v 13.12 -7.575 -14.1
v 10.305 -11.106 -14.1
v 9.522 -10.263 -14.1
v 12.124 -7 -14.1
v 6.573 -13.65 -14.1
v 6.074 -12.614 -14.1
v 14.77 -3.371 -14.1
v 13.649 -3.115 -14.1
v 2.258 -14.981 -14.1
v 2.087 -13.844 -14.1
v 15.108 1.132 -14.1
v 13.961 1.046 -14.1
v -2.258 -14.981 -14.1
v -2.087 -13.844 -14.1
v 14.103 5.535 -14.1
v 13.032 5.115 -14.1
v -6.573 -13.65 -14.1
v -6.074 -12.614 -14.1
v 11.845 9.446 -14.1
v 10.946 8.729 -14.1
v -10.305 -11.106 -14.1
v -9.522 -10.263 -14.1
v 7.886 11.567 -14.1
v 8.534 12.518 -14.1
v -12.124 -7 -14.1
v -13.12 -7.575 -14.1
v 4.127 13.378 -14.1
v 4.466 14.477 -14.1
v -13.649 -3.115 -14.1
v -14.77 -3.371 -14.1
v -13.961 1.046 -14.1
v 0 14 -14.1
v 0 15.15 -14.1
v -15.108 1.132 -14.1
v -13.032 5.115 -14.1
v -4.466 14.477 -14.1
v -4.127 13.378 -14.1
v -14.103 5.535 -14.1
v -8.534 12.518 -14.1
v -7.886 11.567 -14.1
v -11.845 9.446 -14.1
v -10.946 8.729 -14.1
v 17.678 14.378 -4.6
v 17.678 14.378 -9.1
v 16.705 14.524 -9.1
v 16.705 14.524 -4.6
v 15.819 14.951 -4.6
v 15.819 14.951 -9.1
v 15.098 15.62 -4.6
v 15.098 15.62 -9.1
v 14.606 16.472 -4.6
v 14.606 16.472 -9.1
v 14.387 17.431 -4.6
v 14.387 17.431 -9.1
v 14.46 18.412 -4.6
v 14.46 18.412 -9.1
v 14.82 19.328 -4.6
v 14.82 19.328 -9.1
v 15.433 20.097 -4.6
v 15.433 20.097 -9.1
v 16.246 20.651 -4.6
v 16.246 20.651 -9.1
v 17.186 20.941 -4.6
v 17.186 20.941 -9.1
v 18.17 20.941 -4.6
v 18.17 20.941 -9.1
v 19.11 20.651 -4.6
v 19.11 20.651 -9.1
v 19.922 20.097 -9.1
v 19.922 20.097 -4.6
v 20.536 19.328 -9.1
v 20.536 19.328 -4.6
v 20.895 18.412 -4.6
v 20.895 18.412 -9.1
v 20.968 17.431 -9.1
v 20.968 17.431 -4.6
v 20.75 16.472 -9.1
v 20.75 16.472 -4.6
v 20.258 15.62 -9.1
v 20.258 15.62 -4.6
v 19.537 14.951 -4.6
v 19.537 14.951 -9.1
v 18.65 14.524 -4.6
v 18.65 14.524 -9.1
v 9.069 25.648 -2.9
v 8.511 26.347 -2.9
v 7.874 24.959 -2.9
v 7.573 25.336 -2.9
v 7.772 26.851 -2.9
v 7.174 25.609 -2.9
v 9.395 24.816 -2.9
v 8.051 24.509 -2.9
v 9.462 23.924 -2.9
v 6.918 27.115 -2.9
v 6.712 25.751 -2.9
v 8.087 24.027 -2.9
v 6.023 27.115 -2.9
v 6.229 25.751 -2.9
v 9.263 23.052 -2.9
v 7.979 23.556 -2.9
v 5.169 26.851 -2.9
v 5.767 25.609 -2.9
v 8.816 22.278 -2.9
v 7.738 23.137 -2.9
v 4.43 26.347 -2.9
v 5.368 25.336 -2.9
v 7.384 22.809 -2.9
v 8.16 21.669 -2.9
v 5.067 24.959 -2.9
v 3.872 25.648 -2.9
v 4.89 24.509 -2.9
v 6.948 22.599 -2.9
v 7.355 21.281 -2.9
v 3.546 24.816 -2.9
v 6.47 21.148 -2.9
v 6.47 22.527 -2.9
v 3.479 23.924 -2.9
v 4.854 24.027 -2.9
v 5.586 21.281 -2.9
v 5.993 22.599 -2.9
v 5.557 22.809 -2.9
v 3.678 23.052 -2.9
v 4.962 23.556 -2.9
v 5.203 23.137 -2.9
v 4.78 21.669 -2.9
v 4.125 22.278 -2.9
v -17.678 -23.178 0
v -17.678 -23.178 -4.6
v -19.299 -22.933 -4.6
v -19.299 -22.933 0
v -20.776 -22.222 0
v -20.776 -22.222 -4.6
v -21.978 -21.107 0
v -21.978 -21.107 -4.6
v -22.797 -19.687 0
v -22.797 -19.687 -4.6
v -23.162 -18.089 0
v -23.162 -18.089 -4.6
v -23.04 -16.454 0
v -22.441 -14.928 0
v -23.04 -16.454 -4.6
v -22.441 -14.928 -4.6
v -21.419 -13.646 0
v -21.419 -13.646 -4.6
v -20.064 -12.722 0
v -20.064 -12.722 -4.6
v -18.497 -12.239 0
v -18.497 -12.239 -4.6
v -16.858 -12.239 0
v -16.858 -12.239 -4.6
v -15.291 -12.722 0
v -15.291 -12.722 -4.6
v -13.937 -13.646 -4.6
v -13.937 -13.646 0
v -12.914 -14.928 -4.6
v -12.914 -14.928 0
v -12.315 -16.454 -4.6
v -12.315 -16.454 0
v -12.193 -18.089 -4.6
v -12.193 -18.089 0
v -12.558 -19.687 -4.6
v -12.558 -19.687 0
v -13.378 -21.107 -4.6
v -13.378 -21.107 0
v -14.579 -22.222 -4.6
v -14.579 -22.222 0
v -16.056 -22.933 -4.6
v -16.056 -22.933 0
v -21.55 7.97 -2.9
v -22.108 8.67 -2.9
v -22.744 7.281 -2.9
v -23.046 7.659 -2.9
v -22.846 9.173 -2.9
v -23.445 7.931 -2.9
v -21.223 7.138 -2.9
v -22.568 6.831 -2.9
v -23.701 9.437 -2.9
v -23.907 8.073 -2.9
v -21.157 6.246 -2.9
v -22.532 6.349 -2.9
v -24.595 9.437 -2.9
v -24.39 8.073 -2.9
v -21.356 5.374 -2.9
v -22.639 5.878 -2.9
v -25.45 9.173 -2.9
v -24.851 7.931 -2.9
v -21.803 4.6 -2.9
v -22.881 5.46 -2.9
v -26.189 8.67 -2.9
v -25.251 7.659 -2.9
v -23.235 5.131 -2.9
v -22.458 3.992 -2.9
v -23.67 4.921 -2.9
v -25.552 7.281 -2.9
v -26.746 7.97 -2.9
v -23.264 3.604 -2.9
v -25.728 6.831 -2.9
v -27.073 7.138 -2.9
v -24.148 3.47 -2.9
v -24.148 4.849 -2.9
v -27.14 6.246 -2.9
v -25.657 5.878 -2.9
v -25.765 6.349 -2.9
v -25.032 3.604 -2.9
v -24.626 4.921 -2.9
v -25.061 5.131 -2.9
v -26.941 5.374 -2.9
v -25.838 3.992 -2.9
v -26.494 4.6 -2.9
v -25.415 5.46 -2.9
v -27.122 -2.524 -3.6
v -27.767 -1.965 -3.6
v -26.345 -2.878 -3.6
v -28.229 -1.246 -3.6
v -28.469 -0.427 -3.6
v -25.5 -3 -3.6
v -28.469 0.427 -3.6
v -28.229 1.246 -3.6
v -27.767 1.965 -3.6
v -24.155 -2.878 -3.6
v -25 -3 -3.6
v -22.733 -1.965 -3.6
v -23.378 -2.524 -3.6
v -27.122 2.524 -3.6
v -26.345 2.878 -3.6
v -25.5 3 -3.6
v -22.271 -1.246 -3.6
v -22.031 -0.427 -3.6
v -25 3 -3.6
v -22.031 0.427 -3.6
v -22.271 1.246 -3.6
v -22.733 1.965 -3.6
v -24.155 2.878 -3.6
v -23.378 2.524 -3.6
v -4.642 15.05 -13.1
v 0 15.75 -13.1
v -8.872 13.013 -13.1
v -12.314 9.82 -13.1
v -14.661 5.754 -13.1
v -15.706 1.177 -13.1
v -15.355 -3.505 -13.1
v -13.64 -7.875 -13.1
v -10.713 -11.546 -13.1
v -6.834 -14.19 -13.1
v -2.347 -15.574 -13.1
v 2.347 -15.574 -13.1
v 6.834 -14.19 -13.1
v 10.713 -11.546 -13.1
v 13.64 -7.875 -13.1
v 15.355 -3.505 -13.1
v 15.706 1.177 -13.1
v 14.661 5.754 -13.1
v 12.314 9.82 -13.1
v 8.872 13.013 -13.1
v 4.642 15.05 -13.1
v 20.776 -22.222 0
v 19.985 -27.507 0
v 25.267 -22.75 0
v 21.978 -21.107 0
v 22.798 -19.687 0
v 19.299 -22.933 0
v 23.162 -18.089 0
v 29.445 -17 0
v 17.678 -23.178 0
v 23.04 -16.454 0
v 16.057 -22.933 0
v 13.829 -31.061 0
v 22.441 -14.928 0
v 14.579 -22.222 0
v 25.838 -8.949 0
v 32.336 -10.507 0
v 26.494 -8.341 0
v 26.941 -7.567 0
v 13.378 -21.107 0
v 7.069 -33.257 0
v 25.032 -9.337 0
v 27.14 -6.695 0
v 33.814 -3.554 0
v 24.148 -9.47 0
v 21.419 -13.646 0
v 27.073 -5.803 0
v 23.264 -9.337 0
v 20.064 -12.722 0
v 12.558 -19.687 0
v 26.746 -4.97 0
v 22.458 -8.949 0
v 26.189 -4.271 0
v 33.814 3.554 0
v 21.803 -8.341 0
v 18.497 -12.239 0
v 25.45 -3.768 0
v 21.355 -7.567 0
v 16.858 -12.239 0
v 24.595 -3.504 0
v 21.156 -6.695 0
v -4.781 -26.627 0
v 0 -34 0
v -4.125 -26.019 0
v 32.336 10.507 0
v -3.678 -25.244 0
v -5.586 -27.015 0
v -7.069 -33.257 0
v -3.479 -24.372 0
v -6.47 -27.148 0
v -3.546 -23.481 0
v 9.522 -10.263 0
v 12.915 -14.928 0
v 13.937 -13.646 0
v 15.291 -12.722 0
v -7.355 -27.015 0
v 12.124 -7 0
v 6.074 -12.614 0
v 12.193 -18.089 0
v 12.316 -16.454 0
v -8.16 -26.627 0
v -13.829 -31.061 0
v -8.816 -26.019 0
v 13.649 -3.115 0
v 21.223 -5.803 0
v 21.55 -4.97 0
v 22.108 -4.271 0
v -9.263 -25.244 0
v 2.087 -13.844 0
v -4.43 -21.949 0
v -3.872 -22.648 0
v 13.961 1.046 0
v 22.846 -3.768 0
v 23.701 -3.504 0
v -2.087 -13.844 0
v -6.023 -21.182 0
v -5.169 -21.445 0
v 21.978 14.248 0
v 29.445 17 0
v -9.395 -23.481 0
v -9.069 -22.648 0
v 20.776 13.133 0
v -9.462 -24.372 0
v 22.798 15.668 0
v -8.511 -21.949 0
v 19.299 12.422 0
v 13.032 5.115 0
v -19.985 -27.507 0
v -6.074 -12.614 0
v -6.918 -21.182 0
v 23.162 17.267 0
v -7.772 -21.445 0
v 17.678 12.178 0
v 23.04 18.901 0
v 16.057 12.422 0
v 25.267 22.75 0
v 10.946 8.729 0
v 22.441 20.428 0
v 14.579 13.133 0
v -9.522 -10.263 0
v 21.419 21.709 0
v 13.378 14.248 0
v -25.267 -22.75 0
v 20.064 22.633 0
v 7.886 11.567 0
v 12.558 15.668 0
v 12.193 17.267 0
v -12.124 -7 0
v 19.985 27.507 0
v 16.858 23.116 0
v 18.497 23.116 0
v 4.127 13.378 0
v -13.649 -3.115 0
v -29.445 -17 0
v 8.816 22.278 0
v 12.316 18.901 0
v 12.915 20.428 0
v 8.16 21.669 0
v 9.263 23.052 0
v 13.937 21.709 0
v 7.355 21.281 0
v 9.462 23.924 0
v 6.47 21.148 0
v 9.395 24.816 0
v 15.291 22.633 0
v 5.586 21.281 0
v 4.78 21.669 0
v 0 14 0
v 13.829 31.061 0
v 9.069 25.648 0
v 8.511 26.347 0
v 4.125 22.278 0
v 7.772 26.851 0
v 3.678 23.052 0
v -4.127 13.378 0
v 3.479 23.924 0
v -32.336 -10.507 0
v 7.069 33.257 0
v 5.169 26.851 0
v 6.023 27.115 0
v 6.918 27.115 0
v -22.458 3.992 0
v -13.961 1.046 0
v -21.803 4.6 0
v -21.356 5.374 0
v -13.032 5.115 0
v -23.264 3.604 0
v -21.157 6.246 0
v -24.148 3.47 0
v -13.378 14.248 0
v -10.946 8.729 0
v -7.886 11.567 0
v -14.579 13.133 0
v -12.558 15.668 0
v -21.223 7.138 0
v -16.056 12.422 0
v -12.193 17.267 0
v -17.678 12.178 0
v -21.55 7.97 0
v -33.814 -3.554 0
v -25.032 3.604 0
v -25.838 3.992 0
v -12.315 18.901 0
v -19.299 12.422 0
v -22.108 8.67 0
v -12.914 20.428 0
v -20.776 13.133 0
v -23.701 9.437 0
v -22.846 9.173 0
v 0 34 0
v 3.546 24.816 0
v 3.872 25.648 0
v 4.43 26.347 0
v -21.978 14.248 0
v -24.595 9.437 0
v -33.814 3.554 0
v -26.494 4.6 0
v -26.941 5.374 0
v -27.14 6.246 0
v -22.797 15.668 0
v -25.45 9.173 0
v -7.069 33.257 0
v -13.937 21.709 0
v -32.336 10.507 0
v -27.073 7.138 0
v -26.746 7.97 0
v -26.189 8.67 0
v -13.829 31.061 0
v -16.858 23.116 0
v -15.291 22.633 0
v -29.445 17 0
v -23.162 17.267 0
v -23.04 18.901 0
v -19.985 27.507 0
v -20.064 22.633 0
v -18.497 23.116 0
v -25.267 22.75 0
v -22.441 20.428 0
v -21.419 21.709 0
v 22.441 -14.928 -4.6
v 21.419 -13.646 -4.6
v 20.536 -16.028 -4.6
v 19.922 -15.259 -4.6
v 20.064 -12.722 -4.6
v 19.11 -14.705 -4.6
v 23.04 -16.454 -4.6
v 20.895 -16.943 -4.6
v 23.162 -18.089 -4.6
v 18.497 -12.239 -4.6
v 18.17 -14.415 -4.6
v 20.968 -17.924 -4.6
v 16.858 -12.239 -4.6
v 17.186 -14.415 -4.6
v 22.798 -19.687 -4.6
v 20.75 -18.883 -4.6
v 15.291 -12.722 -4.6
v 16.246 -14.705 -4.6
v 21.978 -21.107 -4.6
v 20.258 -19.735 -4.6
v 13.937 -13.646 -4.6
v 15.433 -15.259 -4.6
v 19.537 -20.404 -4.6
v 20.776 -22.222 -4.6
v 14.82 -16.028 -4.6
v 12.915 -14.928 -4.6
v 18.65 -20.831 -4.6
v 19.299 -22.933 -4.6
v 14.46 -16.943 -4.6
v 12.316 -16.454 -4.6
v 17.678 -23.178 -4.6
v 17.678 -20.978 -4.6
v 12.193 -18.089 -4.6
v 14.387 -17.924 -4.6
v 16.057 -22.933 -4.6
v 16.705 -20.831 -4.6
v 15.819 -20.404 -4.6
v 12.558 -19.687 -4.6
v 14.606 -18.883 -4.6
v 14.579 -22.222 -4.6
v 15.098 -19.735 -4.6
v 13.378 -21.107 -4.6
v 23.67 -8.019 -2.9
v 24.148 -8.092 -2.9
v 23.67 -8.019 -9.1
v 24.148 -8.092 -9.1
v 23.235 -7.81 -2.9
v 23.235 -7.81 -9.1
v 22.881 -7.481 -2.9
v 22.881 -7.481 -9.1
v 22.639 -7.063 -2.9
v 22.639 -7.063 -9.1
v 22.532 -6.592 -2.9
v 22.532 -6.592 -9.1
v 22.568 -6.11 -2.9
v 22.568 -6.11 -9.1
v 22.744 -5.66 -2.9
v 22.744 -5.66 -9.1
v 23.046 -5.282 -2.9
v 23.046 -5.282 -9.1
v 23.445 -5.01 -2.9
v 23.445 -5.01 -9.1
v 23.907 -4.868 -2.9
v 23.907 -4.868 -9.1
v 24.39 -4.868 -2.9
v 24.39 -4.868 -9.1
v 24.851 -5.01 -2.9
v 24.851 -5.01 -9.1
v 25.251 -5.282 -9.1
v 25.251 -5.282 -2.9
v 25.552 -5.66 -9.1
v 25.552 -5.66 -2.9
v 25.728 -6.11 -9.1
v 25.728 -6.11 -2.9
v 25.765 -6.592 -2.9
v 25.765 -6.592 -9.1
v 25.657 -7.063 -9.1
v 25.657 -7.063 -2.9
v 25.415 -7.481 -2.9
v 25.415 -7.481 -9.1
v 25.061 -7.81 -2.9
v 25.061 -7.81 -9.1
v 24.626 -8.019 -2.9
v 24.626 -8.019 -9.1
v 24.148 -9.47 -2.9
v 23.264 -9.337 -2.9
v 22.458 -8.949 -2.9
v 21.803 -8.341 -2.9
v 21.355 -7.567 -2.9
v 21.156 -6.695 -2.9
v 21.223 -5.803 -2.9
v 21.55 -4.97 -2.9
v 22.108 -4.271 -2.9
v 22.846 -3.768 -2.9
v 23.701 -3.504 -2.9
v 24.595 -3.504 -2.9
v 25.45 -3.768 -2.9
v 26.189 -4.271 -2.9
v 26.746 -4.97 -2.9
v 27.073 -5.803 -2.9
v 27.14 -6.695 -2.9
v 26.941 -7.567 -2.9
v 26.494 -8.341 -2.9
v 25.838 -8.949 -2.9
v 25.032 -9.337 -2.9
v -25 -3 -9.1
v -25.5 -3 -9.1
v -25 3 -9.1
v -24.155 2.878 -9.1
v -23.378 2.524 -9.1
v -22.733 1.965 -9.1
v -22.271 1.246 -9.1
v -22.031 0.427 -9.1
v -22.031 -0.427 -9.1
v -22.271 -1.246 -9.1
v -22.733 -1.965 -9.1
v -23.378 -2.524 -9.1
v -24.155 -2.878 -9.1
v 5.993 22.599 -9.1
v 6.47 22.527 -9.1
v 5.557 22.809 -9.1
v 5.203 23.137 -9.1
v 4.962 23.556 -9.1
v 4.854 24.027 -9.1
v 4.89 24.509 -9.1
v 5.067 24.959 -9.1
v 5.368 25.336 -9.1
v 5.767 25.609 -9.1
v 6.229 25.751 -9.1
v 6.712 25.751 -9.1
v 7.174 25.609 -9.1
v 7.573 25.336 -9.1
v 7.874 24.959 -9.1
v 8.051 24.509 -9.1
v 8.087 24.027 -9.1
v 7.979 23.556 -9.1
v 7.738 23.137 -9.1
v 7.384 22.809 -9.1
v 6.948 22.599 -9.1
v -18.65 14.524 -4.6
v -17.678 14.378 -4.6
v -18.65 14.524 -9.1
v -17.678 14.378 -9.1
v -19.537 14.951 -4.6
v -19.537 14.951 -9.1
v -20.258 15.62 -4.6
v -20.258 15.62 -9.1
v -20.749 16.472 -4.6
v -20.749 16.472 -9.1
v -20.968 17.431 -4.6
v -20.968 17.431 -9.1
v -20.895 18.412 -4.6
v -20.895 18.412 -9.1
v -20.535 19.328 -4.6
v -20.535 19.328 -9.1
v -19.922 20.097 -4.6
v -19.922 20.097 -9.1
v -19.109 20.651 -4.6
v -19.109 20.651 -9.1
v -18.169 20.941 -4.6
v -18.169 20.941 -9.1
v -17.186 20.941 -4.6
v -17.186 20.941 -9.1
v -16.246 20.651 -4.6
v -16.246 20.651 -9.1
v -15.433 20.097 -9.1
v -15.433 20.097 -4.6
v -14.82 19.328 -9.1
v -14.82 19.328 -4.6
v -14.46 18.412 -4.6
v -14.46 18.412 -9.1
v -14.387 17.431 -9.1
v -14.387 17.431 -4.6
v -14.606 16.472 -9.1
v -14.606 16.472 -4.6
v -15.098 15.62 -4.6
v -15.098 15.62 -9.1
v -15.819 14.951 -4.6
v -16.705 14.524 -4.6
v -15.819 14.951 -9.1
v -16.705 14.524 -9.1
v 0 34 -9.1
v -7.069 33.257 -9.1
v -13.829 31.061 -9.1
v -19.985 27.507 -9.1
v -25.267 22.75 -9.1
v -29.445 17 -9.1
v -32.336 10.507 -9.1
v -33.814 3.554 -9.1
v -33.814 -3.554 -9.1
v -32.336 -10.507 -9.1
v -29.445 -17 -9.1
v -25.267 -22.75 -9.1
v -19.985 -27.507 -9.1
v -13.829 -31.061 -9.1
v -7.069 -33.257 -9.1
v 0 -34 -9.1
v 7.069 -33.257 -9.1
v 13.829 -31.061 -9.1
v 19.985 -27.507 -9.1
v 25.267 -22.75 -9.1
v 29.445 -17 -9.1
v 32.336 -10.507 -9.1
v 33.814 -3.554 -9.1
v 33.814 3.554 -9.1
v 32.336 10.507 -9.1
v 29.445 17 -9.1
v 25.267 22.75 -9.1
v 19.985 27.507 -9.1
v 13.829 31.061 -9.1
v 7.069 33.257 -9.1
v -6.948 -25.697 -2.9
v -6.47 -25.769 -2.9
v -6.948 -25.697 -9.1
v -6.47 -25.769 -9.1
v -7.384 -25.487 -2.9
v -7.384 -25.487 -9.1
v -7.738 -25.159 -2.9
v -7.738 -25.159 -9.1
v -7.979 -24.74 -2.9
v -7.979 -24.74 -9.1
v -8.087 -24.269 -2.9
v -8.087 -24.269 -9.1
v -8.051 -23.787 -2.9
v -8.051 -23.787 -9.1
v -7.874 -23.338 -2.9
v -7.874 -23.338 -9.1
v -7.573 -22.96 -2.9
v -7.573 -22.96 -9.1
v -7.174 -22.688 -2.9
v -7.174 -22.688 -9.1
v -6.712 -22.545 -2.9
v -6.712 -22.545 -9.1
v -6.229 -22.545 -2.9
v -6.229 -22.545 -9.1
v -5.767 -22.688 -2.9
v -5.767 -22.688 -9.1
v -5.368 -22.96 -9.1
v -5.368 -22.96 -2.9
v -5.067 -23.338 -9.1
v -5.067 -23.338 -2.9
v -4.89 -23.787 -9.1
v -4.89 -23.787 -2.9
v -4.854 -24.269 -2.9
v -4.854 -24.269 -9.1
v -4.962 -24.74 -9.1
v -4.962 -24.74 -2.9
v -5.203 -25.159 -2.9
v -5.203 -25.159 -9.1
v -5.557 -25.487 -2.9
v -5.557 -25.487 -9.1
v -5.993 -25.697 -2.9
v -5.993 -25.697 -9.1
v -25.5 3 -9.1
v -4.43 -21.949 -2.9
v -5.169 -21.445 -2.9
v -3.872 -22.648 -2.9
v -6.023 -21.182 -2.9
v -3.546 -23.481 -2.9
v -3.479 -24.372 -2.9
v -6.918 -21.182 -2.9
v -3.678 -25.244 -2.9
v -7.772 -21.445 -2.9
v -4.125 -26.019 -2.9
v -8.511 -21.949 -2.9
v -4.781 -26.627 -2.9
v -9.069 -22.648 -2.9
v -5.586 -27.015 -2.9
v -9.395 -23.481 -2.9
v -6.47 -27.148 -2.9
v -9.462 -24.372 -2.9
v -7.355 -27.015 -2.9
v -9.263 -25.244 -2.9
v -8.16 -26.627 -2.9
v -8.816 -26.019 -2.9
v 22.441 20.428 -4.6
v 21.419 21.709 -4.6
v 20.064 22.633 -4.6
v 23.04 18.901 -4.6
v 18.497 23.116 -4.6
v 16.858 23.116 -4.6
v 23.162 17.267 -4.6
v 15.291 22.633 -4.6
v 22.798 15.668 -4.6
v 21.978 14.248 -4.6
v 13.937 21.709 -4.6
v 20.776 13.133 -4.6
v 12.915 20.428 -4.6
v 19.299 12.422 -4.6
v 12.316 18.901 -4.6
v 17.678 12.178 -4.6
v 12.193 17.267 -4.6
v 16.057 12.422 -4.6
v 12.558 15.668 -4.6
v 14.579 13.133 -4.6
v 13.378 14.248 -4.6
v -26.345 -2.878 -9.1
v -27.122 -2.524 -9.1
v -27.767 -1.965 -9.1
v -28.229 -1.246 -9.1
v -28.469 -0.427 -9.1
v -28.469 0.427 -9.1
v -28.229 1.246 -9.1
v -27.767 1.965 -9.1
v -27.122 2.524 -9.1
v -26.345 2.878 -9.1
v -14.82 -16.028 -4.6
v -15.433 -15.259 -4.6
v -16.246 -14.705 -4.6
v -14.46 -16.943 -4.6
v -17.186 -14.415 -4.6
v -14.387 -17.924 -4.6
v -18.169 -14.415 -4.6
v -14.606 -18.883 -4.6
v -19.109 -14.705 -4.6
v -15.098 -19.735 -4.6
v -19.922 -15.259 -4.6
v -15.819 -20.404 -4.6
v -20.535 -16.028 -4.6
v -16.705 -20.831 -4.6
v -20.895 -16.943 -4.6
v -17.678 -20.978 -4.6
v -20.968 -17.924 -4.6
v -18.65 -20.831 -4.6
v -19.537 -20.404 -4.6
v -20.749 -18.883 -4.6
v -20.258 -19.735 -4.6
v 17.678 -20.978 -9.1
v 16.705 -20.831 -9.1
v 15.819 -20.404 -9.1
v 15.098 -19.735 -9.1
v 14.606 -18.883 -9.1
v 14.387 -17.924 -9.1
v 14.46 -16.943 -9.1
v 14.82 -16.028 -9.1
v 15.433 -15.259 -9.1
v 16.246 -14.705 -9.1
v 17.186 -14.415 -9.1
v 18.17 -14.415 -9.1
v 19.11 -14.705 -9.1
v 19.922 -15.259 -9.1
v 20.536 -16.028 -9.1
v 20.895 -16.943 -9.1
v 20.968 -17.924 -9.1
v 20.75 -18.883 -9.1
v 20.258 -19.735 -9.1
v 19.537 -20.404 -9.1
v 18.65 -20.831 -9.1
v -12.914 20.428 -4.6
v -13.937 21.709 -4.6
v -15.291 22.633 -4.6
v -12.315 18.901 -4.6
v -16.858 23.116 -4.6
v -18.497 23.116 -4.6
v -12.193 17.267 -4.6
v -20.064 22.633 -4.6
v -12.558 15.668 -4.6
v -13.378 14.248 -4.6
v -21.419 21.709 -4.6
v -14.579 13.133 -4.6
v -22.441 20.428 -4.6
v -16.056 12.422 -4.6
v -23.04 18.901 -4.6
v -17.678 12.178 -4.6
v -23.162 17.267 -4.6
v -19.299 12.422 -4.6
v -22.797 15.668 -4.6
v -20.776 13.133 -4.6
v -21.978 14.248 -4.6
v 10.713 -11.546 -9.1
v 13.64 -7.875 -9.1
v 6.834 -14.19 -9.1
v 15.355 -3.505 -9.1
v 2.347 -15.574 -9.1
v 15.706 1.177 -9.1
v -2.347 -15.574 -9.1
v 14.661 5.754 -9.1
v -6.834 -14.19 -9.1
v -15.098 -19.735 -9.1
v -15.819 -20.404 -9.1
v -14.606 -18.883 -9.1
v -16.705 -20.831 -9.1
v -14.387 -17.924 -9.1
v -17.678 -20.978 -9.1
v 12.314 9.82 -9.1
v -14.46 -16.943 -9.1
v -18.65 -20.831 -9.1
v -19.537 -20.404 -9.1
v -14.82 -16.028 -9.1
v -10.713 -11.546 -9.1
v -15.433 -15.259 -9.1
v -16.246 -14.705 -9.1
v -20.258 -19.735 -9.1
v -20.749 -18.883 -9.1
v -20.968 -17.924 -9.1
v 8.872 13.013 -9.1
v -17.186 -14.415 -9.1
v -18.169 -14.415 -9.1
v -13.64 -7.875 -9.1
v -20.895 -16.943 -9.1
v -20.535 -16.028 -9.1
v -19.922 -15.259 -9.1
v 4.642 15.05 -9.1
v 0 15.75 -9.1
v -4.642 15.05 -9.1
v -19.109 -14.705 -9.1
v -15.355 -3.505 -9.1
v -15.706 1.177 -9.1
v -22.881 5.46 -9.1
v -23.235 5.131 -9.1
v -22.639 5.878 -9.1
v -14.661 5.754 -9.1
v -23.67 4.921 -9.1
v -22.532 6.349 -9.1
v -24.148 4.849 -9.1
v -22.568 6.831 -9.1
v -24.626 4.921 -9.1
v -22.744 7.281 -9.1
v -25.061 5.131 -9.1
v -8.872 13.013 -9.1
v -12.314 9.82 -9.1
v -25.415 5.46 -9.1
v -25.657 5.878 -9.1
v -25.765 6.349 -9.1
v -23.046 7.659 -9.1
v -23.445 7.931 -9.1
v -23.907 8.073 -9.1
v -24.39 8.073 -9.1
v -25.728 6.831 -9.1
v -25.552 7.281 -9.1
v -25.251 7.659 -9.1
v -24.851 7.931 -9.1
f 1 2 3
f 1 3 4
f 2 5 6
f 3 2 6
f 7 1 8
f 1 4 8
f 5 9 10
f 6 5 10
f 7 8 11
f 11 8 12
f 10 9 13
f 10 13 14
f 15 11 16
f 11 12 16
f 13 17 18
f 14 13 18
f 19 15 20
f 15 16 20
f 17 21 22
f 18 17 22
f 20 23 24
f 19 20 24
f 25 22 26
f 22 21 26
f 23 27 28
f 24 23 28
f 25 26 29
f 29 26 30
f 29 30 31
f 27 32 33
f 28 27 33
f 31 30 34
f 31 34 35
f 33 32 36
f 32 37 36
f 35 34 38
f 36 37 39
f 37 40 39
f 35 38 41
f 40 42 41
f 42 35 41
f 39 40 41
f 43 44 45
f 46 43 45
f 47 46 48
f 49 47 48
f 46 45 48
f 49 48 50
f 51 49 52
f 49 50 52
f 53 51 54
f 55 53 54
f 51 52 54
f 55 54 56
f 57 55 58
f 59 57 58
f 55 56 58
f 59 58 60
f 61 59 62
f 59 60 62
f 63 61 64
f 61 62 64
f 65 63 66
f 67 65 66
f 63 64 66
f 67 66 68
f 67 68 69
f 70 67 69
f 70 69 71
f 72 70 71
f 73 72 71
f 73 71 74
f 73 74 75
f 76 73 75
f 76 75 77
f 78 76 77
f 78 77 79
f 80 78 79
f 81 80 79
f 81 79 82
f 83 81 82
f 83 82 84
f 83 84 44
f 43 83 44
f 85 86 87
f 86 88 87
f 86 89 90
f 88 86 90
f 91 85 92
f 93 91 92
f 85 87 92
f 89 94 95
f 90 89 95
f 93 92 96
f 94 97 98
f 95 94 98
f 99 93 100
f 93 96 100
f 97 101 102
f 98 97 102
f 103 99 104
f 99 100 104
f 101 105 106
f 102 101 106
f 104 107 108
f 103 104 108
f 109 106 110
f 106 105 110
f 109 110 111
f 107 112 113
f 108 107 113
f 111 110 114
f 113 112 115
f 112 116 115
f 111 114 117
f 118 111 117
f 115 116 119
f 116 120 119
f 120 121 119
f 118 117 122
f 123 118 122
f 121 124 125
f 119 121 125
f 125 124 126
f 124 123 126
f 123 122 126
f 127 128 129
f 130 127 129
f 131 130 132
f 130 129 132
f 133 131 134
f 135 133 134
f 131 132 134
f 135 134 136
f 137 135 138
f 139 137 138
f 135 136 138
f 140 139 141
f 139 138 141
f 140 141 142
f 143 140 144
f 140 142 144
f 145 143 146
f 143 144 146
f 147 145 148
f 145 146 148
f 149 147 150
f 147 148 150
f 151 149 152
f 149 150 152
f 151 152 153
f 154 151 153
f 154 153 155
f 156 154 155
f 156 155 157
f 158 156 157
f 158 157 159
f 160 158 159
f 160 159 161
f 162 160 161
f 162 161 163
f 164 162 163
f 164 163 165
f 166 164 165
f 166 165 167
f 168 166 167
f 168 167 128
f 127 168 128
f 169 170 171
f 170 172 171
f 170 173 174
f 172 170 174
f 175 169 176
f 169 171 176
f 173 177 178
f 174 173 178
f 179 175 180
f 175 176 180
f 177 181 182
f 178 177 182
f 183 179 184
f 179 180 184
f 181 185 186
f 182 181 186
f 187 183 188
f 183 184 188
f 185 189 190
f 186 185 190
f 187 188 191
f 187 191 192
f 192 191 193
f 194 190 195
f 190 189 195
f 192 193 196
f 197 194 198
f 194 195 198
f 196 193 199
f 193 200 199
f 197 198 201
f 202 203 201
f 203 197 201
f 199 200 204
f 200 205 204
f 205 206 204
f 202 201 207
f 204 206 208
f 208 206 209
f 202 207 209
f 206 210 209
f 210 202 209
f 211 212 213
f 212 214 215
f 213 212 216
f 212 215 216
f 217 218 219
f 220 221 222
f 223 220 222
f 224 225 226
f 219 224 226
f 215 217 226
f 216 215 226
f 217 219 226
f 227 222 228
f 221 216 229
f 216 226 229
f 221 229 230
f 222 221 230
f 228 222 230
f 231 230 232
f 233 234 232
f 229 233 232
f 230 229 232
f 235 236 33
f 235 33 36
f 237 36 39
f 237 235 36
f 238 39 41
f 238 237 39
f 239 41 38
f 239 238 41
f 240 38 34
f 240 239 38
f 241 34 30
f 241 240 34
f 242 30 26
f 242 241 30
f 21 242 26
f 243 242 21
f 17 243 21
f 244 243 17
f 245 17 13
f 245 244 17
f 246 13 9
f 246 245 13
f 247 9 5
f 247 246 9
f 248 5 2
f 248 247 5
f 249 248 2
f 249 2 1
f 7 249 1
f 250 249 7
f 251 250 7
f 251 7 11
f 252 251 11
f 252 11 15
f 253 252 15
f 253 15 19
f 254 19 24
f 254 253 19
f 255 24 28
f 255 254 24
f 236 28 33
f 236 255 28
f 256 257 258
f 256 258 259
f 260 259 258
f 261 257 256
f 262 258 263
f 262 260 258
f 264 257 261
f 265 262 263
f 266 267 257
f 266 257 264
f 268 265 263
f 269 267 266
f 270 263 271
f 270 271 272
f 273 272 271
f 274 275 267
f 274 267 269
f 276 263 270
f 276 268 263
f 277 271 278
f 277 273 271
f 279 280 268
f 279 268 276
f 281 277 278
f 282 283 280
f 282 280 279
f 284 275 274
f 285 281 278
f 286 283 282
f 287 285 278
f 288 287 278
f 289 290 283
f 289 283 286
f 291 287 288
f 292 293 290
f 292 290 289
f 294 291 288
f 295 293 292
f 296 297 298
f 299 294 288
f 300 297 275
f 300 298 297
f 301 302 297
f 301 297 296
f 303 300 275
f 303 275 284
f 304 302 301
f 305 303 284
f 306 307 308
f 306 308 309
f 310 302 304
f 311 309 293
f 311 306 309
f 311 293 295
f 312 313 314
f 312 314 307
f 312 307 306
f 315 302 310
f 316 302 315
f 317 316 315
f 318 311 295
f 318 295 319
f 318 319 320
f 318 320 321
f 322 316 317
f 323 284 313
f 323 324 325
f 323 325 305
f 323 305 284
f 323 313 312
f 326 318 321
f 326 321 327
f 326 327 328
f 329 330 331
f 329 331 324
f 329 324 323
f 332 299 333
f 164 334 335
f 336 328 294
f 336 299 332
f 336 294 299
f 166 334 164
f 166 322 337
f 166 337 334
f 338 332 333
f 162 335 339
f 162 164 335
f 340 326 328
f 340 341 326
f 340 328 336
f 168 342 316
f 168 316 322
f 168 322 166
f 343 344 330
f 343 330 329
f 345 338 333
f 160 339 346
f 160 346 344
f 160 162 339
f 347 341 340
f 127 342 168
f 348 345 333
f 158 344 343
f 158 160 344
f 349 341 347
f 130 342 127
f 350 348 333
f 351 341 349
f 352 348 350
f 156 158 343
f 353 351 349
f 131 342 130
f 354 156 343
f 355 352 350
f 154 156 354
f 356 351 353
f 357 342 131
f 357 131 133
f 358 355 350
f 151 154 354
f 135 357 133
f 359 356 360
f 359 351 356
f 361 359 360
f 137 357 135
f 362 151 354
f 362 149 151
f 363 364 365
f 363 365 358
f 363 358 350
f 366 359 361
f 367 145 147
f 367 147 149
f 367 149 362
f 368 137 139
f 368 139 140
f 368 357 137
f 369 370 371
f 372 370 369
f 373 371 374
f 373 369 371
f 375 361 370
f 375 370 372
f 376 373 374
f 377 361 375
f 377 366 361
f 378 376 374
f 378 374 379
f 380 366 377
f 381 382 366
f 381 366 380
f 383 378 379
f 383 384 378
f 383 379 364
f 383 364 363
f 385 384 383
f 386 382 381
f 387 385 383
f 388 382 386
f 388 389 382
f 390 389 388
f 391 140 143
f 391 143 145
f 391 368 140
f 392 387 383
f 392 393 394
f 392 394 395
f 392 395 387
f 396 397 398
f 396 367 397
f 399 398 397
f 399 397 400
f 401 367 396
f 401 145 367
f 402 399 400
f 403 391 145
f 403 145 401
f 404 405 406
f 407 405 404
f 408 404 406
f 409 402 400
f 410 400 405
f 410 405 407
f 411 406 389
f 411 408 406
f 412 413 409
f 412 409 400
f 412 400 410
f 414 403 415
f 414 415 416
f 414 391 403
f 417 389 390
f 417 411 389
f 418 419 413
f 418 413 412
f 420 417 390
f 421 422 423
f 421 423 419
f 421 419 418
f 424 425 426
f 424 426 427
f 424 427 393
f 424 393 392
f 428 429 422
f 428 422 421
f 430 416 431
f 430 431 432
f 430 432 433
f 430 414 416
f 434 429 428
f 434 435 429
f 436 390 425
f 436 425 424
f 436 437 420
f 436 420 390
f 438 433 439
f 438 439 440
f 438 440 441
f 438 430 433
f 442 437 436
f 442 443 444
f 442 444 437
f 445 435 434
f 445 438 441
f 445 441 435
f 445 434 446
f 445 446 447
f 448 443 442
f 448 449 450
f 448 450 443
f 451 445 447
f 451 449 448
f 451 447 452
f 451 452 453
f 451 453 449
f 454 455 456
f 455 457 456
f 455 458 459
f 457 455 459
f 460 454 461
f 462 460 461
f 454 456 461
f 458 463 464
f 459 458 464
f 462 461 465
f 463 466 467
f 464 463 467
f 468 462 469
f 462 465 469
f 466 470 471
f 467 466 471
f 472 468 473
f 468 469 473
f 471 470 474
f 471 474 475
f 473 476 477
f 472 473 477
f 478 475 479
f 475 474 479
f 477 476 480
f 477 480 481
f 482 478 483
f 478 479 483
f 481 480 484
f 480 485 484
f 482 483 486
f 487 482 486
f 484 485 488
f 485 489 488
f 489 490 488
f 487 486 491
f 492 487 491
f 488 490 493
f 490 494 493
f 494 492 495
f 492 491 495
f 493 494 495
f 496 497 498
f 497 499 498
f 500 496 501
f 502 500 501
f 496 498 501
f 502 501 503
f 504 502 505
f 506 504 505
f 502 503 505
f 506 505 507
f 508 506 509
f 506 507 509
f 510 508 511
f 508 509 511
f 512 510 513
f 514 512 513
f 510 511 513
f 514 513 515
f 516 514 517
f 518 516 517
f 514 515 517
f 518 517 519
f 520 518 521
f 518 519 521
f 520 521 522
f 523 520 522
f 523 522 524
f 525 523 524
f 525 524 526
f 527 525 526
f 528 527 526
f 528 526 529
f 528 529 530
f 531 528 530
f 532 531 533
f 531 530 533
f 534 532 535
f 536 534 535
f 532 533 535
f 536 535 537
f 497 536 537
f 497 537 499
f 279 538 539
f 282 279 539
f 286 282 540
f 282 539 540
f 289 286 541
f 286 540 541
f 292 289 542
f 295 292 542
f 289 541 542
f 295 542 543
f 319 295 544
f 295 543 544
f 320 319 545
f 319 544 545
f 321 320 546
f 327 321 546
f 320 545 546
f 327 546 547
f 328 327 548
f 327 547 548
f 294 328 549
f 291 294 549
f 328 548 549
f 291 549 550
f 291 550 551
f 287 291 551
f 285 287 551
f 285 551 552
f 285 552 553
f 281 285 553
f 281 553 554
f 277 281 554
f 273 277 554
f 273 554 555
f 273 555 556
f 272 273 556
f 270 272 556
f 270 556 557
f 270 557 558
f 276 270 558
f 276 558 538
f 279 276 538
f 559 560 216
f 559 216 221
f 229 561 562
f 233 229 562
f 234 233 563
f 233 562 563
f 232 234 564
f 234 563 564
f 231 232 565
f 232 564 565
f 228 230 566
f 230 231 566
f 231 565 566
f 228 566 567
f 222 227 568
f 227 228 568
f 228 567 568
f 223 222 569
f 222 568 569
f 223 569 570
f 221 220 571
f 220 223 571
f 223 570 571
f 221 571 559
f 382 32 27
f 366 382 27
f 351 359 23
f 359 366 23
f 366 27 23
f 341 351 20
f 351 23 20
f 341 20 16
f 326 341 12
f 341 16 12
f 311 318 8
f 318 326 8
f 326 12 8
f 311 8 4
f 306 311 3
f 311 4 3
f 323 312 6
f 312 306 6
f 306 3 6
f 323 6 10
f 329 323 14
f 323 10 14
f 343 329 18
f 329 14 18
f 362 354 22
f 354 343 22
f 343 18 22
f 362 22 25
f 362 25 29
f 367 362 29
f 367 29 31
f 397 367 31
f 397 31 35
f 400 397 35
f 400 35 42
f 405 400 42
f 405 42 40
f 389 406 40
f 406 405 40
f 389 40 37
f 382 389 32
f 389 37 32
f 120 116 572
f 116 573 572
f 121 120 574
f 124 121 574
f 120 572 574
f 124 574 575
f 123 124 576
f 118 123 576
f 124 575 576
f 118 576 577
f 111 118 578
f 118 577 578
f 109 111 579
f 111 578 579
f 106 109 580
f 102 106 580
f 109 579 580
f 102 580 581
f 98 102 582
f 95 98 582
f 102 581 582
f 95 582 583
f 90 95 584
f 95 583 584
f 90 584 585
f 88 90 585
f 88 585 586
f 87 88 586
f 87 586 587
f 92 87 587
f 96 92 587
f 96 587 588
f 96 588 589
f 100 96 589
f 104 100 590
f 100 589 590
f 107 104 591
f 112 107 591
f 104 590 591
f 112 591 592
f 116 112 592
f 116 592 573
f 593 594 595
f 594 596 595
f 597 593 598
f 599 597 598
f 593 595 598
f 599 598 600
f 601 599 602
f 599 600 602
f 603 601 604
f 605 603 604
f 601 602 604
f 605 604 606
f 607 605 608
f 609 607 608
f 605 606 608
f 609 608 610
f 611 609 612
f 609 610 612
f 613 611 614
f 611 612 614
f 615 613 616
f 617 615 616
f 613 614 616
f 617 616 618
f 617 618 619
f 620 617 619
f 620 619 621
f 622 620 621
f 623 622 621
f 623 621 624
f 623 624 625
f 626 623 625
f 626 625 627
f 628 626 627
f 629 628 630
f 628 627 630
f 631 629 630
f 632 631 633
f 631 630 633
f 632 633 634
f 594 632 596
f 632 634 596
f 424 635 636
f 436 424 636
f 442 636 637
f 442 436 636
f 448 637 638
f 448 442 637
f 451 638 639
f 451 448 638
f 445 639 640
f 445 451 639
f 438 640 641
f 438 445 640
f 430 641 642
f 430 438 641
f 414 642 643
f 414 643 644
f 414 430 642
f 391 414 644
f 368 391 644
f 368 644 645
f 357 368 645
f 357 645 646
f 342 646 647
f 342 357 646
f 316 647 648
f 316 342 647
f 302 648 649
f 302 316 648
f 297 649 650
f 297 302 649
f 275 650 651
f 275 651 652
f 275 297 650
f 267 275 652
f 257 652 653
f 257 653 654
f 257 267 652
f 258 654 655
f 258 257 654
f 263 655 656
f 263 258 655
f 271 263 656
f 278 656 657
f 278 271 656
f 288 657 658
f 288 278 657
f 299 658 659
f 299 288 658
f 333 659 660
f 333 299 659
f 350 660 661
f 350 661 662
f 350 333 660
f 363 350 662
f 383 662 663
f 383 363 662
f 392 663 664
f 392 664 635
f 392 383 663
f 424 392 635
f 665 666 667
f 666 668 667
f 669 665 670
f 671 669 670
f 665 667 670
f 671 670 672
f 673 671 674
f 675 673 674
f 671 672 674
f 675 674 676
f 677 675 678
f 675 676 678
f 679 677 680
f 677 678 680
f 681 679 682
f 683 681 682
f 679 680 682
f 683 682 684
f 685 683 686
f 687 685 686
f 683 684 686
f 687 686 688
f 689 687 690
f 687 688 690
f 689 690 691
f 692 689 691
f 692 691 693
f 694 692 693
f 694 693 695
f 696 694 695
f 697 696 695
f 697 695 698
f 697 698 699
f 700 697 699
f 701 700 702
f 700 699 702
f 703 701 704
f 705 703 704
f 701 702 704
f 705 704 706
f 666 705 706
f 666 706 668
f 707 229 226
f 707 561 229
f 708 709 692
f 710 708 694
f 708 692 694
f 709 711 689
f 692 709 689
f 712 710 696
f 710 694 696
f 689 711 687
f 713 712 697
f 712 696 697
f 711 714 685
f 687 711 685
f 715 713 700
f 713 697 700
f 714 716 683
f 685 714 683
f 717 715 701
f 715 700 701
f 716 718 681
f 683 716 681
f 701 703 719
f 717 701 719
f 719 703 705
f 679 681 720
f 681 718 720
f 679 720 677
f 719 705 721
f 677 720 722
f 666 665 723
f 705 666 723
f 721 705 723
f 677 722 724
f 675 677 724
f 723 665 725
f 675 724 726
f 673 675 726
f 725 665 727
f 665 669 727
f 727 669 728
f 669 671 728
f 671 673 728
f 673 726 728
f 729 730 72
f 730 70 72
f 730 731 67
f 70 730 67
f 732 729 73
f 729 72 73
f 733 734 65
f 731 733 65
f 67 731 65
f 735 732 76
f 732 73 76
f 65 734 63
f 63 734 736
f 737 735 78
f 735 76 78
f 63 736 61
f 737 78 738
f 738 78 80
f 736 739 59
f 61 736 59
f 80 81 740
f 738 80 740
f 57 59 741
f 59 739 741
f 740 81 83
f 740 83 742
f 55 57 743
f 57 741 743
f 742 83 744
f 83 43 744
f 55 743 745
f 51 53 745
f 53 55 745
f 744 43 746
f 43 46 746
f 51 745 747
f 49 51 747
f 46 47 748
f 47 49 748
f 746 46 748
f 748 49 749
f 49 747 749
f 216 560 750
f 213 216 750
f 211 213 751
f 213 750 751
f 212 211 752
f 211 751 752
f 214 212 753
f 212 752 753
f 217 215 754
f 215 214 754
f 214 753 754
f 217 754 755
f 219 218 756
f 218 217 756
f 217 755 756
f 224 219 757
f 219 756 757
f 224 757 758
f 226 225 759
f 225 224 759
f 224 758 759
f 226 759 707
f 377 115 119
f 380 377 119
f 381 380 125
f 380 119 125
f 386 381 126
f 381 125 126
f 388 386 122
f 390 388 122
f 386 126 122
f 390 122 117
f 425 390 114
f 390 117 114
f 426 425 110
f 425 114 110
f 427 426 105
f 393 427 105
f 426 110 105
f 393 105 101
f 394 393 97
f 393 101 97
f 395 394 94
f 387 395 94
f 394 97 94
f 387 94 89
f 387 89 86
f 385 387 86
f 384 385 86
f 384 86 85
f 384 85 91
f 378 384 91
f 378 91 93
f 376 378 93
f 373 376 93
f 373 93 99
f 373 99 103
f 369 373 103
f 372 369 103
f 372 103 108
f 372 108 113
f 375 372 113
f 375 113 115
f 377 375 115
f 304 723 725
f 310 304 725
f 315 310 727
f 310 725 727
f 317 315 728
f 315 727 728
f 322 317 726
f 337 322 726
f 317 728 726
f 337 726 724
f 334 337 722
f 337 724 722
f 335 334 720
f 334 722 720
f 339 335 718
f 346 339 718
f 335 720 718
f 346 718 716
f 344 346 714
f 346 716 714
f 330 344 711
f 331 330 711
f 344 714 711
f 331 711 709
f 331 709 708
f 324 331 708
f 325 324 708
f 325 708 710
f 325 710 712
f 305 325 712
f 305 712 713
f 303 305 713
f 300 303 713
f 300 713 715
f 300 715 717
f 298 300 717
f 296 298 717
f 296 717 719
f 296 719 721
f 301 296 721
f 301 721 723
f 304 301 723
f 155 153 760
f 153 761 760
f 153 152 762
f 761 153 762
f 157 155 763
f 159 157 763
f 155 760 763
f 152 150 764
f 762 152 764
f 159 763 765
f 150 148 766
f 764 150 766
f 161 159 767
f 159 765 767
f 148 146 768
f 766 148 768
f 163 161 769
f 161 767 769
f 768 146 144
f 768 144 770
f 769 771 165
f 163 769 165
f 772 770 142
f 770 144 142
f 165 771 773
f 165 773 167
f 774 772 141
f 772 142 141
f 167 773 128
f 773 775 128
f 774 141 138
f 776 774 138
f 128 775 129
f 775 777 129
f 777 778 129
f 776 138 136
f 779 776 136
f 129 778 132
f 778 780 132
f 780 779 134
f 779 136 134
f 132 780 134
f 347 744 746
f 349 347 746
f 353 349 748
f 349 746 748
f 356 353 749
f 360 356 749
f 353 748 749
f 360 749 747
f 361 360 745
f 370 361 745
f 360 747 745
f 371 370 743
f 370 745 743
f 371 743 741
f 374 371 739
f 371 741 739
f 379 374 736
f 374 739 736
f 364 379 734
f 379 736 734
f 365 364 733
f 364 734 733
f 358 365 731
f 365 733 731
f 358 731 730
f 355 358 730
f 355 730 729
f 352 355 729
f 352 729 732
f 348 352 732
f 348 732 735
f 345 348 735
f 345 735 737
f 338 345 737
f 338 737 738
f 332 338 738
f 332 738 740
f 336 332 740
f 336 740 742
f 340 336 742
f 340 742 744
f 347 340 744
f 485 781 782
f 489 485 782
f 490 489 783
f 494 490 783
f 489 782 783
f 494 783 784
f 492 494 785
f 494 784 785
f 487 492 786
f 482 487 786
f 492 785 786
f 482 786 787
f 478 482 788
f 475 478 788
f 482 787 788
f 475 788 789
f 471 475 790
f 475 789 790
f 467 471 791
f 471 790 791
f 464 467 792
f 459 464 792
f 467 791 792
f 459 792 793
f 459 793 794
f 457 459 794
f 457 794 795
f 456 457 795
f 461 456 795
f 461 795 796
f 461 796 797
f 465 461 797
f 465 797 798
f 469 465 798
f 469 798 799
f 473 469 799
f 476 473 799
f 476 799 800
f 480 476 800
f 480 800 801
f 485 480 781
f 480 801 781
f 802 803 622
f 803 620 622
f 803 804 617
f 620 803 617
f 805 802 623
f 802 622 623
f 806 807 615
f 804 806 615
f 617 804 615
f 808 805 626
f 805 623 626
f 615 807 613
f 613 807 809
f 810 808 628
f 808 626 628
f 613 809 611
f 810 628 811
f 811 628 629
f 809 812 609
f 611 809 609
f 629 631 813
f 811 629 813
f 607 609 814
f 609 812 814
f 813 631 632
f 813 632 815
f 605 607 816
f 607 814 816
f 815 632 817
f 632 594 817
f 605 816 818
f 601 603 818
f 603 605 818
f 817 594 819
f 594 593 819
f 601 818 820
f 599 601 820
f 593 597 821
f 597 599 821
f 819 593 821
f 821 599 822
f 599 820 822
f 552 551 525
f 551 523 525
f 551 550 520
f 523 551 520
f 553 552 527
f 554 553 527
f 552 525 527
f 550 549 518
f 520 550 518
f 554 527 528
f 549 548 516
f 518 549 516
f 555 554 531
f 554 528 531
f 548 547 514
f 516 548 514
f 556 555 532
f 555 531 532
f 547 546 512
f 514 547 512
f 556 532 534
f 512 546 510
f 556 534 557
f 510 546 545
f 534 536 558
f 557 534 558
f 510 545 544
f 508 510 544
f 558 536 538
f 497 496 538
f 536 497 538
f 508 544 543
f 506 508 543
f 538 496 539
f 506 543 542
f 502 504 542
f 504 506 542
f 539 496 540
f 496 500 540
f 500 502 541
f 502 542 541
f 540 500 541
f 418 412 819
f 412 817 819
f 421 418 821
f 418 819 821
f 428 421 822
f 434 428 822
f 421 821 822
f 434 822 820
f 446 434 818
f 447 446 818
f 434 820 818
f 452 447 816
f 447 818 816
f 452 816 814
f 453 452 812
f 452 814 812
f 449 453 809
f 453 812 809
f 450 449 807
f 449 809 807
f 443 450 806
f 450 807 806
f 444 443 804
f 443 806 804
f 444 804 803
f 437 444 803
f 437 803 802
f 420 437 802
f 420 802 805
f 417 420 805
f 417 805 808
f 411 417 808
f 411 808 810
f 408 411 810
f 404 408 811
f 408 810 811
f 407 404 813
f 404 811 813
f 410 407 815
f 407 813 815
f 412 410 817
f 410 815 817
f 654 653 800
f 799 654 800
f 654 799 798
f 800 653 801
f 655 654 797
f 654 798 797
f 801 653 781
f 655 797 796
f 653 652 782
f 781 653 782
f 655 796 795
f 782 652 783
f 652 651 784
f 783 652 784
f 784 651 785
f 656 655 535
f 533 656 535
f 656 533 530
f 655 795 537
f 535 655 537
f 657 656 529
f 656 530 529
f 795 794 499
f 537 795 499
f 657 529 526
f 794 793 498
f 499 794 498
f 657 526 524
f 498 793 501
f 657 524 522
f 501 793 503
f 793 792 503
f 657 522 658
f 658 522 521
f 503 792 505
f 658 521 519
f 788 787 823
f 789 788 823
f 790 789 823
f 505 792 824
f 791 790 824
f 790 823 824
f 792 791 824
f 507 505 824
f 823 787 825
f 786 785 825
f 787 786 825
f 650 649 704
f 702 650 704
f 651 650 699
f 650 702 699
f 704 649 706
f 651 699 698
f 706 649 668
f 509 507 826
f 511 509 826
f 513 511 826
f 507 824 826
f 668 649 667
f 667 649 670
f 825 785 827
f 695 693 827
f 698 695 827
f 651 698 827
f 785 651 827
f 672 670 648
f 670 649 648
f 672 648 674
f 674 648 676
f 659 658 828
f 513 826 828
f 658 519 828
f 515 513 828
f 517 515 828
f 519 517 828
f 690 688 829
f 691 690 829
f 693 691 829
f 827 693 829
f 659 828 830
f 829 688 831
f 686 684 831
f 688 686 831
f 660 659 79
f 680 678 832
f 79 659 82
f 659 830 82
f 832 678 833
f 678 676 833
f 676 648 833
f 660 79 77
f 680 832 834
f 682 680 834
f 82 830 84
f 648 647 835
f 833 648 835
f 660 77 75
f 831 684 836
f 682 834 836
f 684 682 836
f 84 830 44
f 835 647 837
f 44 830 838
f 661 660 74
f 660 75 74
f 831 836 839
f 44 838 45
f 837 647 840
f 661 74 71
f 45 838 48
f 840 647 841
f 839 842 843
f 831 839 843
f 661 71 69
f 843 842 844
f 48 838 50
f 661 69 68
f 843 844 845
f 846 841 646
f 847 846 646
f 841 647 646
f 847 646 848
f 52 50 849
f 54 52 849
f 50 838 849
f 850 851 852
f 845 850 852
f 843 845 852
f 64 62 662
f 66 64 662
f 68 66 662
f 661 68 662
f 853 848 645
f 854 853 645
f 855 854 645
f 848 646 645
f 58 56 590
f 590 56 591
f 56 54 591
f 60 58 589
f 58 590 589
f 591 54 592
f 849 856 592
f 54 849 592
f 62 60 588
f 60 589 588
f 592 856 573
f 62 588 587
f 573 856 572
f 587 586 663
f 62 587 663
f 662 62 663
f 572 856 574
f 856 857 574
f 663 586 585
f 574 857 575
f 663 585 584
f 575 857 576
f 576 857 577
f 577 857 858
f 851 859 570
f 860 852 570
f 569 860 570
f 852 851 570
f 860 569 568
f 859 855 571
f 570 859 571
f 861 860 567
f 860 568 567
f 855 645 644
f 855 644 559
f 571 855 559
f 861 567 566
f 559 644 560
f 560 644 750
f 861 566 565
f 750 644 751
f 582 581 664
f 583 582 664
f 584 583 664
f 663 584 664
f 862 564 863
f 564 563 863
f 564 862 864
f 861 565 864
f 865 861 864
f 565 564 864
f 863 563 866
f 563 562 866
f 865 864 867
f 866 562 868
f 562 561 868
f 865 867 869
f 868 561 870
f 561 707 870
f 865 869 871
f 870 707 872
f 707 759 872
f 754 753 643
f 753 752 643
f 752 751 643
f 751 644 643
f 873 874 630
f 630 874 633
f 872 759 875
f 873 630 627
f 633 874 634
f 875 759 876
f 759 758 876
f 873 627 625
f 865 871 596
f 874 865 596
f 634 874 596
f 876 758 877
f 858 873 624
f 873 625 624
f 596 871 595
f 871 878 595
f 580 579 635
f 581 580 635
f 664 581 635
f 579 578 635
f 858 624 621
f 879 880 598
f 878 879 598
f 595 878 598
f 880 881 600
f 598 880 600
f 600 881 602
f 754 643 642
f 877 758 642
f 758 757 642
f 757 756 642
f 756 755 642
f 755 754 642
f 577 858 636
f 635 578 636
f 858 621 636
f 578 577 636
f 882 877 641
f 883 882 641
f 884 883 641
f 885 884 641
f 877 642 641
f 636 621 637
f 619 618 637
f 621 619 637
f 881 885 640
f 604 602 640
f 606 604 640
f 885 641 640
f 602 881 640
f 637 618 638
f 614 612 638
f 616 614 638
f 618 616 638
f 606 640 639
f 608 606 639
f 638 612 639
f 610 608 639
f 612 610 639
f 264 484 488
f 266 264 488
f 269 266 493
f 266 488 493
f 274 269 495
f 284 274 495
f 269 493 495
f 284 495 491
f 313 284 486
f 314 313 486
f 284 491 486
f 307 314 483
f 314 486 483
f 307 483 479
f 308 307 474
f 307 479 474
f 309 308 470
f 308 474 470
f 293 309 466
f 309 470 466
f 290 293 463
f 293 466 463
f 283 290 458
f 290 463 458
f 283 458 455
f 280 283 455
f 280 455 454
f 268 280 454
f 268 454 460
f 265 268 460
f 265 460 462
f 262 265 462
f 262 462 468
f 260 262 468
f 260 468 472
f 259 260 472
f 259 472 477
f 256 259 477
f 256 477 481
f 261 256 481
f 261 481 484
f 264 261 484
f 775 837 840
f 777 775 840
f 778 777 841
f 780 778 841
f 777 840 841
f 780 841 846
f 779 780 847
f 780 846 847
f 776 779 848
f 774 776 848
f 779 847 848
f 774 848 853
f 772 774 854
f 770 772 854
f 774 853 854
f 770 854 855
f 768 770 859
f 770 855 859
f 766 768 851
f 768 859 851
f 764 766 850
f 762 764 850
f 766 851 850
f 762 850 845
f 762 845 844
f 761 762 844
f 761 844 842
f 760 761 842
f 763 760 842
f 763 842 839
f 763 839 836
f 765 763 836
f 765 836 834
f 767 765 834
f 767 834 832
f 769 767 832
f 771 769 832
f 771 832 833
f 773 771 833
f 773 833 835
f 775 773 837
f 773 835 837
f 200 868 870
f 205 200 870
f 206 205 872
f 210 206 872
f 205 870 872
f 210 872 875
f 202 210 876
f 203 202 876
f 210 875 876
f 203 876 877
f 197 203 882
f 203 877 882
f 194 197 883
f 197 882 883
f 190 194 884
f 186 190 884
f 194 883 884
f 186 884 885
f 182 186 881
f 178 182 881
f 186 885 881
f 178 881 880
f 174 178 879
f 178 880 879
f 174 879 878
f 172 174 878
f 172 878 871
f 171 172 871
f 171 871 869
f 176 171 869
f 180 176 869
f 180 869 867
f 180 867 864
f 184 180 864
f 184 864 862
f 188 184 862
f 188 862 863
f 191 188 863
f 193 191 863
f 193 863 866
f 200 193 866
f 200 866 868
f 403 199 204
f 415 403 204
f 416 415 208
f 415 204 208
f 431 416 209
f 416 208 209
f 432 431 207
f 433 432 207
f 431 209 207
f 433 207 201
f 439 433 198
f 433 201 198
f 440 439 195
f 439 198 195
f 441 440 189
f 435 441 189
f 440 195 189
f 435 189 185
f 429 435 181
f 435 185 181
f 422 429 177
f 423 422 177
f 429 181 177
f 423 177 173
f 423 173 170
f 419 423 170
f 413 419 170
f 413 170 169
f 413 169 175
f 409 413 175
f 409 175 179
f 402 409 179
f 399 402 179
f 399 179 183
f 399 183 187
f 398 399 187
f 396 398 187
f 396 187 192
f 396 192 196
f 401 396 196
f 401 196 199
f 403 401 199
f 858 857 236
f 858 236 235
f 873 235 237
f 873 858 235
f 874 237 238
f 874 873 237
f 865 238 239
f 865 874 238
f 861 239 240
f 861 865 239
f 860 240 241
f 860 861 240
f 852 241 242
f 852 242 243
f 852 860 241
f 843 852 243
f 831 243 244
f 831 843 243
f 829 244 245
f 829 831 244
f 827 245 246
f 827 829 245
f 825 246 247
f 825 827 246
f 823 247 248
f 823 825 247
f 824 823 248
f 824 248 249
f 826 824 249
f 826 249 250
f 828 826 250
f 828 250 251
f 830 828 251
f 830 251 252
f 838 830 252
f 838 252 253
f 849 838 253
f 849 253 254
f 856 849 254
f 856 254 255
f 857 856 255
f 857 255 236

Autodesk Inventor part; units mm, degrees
sketch "Sketch_1" plane through (0, 0, 0) normal (1, 0, 0) x (0, 1, 0)
  line L0 (0, -14.1) -> (0, 0)
  line L1 (34, 0) -> (14, 0)
  line L2 (14, 0) -> (14, -14.1)
  line L3 (14, -14.1) -> (15.75, -14.1)
  line L4 (15.75, -14.1) -> (15.75, -9.1)
  line L5 (15.75, -9.1) -> (34, -9.1)
  line L6 (34, -9.1) -> (34, 0)
revolve "Revolution1" add sketch "Sketch_1" angle 360 about axis through (0, 0, -14.1) along (0, 0, 1)
chamfer "Chamfer1" distance 0.6 distance2 1 1 edges at (0, -15.75, -14.1) measured on face at (1.2564, 15.0141, -14.1)
sketch "Sketch2" plane through (0, 0, 0) normal (0, 0, 1) x (1, 0, 0)
  point P0 (24.1481, -6.4705)
hole "Hole1" at (24.1481, -6.4705, 0) direction (0, 0, -1) diameter 3.242 depth 9.1 counterbore diameter 6 counterbore depth 2.9 thread size "M4x0.7" class "6H" standard "ISO Metric profile"
pattern_linear "Rectangular Pattern1" count 2 spacing 35.3553 along (-0.5, 0.866, 0) count 2 spacing 35.3553 along (-0.866, -0.5, 0) of "Hole1"
sketch "Sketch3" plane through (0, 0, 0) normal (0, 0, 1) x (1, 0, 0)
  point P0 (17.6777, -17.6777)
hole "Hole2" at (17.6777, -17.6777, 0) direction (0, 0, -1) diameter 6.6 depth 14.1 counterbore diameter 11 counterbore depth 4.6
pattern_linear "Rectangular Pattern2" count 2 spacing 35.3553 along (0, 1, 0) count 2 spacing 35.3553 along (-1, 0, 0) of "Hole2"
sketch "Sketch_6" plane through (0, 0, -9.1) normal (0, 0, 1) x (1, 0, 0)
  arc A0 (-25.5, 3) -> (-25.5, -3) centre (-25.5, 0) ccw
  line L0 (-25.5, -3) -> (-25, -3)
  arc A1 (-25, -3) -> (-25, 3) centre (-25, 0) ccw
  line L1 (-25, 3) -> (-25.5, 3)
extrude "Extrusion1" cut sketch "Sketch_6" along normal blind 5.5
ref_plane "fla_XY" through (0, 0, 0) normal (0, 0, 1) x (1, 0, 0)
ref_plane "fla_YZ" through (0, 0, 0) normal (1, 0, 0) x (0, 1, 0)
ref_plane "fla_ZX" through (0, 0, 0) normal (0, 1, 0) x (0, 0, 1)
properties part number "SCHUNK-1013180-ISO-1-50-M6 Universalflansch Co-act-EGP-C"
